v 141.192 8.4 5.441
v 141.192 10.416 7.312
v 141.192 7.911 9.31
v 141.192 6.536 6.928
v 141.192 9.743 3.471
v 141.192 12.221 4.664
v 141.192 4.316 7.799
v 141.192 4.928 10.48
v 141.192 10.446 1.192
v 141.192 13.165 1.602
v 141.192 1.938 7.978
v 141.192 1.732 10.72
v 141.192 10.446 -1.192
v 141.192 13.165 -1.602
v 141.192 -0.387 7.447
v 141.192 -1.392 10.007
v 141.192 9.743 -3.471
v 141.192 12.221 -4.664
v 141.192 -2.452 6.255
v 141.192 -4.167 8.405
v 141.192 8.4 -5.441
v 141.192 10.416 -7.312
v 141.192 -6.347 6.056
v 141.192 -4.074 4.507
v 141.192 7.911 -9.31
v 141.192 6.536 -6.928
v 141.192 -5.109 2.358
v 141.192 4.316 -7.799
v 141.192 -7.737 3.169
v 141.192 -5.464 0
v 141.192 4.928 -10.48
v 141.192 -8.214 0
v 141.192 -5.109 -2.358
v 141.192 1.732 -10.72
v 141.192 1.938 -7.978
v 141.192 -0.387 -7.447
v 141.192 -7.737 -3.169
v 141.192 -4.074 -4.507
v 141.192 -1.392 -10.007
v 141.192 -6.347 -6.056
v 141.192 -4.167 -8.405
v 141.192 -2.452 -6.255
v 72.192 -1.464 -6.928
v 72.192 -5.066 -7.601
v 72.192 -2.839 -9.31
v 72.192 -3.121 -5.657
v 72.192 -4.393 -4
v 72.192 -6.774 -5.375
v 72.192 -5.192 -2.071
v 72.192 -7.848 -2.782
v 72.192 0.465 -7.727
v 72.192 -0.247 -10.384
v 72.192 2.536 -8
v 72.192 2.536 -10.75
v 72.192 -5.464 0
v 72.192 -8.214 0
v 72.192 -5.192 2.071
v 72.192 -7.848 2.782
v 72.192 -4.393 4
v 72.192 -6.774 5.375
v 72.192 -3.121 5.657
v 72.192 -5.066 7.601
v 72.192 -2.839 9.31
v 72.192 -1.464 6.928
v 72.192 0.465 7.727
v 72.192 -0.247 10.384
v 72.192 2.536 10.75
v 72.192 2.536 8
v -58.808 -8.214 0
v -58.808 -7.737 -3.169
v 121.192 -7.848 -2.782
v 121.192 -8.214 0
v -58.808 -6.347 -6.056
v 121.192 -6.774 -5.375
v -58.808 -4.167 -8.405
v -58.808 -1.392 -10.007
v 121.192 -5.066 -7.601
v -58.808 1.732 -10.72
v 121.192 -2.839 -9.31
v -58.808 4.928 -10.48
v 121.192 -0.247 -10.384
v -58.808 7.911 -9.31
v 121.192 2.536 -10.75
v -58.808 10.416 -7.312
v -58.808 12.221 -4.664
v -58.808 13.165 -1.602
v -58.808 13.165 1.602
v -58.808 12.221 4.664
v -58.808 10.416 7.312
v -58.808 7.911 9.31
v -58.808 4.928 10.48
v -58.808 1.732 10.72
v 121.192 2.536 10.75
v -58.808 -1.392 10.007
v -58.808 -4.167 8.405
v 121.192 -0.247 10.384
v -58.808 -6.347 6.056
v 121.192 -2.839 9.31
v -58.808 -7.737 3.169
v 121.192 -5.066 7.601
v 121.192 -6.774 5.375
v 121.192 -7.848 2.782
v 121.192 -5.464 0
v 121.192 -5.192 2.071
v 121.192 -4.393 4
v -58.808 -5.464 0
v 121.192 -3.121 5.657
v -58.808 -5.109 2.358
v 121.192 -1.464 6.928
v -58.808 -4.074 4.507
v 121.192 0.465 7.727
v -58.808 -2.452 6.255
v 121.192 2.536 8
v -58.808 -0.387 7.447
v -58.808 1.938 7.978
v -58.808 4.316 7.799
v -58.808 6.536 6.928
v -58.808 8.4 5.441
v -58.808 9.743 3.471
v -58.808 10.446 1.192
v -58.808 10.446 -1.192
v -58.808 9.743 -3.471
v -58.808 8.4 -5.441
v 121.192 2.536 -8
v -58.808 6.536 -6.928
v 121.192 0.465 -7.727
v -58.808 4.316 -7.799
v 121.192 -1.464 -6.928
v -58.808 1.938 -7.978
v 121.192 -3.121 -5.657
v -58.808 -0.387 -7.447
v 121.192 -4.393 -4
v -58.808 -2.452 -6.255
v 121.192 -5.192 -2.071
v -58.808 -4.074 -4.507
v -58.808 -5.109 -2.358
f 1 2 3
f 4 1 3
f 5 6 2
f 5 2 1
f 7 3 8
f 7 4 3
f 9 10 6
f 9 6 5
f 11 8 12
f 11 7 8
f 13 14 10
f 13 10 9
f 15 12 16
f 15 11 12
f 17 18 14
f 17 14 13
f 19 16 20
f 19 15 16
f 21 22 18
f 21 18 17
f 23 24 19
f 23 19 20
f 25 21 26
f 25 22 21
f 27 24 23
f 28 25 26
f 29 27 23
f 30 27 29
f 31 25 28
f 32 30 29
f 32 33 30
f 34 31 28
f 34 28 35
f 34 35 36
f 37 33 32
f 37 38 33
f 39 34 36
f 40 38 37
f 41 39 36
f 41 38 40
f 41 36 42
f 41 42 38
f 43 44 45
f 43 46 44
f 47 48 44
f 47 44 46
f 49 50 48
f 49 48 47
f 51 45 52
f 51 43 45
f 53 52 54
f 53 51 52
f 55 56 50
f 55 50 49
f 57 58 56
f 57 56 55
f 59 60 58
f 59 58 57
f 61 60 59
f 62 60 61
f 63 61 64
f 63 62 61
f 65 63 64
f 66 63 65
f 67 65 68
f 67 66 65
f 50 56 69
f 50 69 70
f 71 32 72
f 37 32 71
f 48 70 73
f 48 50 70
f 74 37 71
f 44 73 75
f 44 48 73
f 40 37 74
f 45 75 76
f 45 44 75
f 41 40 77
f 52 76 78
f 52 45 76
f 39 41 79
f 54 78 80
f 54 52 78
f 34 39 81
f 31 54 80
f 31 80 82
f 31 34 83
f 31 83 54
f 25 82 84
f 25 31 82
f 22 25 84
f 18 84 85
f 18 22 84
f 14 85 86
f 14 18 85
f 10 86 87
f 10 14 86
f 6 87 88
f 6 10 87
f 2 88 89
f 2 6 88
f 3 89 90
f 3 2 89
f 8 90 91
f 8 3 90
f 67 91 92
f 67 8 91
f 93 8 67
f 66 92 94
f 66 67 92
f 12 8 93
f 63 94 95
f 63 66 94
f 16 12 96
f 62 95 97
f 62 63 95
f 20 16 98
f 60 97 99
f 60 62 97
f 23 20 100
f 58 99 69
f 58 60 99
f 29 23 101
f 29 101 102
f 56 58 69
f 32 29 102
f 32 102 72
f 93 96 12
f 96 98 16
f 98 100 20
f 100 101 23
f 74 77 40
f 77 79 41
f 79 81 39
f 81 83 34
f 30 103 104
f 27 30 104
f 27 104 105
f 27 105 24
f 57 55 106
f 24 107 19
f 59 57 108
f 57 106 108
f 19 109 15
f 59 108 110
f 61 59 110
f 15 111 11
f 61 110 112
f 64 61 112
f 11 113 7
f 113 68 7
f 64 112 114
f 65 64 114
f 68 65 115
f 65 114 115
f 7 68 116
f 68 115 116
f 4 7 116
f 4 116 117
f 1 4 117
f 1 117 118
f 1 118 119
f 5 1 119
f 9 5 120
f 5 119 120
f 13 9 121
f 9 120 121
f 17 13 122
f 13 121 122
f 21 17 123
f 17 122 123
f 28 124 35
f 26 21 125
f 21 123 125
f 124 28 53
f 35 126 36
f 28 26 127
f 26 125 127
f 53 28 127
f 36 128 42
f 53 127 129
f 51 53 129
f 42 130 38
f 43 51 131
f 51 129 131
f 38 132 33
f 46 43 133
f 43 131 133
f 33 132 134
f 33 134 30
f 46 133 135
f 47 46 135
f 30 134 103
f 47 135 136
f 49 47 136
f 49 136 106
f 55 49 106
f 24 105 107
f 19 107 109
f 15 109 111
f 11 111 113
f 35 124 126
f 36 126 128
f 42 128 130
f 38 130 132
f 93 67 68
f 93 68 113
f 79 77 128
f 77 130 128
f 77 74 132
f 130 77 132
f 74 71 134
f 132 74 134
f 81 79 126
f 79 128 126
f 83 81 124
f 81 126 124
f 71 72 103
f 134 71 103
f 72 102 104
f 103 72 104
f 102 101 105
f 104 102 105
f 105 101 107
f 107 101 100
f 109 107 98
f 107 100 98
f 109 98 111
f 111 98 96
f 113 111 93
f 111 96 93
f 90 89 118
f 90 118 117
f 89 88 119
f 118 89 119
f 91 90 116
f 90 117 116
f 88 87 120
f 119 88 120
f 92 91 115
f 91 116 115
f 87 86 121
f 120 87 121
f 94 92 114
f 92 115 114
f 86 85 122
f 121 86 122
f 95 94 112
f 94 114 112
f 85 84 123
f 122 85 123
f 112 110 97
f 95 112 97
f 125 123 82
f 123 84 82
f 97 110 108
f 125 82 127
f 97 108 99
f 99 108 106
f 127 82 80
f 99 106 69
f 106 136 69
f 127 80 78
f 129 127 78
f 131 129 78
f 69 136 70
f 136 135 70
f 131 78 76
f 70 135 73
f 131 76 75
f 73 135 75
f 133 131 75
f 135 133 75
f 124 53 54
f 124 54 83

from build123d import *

# Parameters (mm, degrees)
F0_W     = 131
F0_H     = 10.75
F0_W_2   = 49
F0_W_3   = 20
F2_R     = 8
F3_DEPTH = 300
F4_DEPTH = 13


with BuildPart() as f1:
    # F0 (on Top) → F1 (revolve)
    with BuildSketch(Plane.XY):
        with Locations((6.6921378869, -2.8394986279)):
            Rectangle(F0_W, F0_H)
        with Locations((96.6921378869, -2.8394986279)):
            Rectangle(F0_W_2, F0_H)
        with Locations((131.1921378869, -2.8394986279)):
            Rectangle(F0_W_3, F0_H)
    revolve(axis=Axis((41.1921378869, 2.5355013721, 0), (1, 0, 0)))

    # F2 (on face) → F3 (cut)
    with BuildSketch(Plane(origin=(-58.8078621131, 0, 0), x_dir=(0, -1, 0), z_dir=(-1, 0, 0))):
        with Locations((-2.5355013721, 0)):
            Circle(F2_R)
    extrude(amount=-F3_DEPTH, mode=Mode.SUBTRACT)

    # F0 (on Top) → F4 (cut, symmetric)
    with BuildSketch(Plane.XY):
        with Locations((96.6921378869, -2.8394986279)):
            Rectangle(F0_W_2, F0_H)
    extrude(amount=F4_DEPTH, both=True, mode=Mode.SUBTRACT)


solid = f1.part
